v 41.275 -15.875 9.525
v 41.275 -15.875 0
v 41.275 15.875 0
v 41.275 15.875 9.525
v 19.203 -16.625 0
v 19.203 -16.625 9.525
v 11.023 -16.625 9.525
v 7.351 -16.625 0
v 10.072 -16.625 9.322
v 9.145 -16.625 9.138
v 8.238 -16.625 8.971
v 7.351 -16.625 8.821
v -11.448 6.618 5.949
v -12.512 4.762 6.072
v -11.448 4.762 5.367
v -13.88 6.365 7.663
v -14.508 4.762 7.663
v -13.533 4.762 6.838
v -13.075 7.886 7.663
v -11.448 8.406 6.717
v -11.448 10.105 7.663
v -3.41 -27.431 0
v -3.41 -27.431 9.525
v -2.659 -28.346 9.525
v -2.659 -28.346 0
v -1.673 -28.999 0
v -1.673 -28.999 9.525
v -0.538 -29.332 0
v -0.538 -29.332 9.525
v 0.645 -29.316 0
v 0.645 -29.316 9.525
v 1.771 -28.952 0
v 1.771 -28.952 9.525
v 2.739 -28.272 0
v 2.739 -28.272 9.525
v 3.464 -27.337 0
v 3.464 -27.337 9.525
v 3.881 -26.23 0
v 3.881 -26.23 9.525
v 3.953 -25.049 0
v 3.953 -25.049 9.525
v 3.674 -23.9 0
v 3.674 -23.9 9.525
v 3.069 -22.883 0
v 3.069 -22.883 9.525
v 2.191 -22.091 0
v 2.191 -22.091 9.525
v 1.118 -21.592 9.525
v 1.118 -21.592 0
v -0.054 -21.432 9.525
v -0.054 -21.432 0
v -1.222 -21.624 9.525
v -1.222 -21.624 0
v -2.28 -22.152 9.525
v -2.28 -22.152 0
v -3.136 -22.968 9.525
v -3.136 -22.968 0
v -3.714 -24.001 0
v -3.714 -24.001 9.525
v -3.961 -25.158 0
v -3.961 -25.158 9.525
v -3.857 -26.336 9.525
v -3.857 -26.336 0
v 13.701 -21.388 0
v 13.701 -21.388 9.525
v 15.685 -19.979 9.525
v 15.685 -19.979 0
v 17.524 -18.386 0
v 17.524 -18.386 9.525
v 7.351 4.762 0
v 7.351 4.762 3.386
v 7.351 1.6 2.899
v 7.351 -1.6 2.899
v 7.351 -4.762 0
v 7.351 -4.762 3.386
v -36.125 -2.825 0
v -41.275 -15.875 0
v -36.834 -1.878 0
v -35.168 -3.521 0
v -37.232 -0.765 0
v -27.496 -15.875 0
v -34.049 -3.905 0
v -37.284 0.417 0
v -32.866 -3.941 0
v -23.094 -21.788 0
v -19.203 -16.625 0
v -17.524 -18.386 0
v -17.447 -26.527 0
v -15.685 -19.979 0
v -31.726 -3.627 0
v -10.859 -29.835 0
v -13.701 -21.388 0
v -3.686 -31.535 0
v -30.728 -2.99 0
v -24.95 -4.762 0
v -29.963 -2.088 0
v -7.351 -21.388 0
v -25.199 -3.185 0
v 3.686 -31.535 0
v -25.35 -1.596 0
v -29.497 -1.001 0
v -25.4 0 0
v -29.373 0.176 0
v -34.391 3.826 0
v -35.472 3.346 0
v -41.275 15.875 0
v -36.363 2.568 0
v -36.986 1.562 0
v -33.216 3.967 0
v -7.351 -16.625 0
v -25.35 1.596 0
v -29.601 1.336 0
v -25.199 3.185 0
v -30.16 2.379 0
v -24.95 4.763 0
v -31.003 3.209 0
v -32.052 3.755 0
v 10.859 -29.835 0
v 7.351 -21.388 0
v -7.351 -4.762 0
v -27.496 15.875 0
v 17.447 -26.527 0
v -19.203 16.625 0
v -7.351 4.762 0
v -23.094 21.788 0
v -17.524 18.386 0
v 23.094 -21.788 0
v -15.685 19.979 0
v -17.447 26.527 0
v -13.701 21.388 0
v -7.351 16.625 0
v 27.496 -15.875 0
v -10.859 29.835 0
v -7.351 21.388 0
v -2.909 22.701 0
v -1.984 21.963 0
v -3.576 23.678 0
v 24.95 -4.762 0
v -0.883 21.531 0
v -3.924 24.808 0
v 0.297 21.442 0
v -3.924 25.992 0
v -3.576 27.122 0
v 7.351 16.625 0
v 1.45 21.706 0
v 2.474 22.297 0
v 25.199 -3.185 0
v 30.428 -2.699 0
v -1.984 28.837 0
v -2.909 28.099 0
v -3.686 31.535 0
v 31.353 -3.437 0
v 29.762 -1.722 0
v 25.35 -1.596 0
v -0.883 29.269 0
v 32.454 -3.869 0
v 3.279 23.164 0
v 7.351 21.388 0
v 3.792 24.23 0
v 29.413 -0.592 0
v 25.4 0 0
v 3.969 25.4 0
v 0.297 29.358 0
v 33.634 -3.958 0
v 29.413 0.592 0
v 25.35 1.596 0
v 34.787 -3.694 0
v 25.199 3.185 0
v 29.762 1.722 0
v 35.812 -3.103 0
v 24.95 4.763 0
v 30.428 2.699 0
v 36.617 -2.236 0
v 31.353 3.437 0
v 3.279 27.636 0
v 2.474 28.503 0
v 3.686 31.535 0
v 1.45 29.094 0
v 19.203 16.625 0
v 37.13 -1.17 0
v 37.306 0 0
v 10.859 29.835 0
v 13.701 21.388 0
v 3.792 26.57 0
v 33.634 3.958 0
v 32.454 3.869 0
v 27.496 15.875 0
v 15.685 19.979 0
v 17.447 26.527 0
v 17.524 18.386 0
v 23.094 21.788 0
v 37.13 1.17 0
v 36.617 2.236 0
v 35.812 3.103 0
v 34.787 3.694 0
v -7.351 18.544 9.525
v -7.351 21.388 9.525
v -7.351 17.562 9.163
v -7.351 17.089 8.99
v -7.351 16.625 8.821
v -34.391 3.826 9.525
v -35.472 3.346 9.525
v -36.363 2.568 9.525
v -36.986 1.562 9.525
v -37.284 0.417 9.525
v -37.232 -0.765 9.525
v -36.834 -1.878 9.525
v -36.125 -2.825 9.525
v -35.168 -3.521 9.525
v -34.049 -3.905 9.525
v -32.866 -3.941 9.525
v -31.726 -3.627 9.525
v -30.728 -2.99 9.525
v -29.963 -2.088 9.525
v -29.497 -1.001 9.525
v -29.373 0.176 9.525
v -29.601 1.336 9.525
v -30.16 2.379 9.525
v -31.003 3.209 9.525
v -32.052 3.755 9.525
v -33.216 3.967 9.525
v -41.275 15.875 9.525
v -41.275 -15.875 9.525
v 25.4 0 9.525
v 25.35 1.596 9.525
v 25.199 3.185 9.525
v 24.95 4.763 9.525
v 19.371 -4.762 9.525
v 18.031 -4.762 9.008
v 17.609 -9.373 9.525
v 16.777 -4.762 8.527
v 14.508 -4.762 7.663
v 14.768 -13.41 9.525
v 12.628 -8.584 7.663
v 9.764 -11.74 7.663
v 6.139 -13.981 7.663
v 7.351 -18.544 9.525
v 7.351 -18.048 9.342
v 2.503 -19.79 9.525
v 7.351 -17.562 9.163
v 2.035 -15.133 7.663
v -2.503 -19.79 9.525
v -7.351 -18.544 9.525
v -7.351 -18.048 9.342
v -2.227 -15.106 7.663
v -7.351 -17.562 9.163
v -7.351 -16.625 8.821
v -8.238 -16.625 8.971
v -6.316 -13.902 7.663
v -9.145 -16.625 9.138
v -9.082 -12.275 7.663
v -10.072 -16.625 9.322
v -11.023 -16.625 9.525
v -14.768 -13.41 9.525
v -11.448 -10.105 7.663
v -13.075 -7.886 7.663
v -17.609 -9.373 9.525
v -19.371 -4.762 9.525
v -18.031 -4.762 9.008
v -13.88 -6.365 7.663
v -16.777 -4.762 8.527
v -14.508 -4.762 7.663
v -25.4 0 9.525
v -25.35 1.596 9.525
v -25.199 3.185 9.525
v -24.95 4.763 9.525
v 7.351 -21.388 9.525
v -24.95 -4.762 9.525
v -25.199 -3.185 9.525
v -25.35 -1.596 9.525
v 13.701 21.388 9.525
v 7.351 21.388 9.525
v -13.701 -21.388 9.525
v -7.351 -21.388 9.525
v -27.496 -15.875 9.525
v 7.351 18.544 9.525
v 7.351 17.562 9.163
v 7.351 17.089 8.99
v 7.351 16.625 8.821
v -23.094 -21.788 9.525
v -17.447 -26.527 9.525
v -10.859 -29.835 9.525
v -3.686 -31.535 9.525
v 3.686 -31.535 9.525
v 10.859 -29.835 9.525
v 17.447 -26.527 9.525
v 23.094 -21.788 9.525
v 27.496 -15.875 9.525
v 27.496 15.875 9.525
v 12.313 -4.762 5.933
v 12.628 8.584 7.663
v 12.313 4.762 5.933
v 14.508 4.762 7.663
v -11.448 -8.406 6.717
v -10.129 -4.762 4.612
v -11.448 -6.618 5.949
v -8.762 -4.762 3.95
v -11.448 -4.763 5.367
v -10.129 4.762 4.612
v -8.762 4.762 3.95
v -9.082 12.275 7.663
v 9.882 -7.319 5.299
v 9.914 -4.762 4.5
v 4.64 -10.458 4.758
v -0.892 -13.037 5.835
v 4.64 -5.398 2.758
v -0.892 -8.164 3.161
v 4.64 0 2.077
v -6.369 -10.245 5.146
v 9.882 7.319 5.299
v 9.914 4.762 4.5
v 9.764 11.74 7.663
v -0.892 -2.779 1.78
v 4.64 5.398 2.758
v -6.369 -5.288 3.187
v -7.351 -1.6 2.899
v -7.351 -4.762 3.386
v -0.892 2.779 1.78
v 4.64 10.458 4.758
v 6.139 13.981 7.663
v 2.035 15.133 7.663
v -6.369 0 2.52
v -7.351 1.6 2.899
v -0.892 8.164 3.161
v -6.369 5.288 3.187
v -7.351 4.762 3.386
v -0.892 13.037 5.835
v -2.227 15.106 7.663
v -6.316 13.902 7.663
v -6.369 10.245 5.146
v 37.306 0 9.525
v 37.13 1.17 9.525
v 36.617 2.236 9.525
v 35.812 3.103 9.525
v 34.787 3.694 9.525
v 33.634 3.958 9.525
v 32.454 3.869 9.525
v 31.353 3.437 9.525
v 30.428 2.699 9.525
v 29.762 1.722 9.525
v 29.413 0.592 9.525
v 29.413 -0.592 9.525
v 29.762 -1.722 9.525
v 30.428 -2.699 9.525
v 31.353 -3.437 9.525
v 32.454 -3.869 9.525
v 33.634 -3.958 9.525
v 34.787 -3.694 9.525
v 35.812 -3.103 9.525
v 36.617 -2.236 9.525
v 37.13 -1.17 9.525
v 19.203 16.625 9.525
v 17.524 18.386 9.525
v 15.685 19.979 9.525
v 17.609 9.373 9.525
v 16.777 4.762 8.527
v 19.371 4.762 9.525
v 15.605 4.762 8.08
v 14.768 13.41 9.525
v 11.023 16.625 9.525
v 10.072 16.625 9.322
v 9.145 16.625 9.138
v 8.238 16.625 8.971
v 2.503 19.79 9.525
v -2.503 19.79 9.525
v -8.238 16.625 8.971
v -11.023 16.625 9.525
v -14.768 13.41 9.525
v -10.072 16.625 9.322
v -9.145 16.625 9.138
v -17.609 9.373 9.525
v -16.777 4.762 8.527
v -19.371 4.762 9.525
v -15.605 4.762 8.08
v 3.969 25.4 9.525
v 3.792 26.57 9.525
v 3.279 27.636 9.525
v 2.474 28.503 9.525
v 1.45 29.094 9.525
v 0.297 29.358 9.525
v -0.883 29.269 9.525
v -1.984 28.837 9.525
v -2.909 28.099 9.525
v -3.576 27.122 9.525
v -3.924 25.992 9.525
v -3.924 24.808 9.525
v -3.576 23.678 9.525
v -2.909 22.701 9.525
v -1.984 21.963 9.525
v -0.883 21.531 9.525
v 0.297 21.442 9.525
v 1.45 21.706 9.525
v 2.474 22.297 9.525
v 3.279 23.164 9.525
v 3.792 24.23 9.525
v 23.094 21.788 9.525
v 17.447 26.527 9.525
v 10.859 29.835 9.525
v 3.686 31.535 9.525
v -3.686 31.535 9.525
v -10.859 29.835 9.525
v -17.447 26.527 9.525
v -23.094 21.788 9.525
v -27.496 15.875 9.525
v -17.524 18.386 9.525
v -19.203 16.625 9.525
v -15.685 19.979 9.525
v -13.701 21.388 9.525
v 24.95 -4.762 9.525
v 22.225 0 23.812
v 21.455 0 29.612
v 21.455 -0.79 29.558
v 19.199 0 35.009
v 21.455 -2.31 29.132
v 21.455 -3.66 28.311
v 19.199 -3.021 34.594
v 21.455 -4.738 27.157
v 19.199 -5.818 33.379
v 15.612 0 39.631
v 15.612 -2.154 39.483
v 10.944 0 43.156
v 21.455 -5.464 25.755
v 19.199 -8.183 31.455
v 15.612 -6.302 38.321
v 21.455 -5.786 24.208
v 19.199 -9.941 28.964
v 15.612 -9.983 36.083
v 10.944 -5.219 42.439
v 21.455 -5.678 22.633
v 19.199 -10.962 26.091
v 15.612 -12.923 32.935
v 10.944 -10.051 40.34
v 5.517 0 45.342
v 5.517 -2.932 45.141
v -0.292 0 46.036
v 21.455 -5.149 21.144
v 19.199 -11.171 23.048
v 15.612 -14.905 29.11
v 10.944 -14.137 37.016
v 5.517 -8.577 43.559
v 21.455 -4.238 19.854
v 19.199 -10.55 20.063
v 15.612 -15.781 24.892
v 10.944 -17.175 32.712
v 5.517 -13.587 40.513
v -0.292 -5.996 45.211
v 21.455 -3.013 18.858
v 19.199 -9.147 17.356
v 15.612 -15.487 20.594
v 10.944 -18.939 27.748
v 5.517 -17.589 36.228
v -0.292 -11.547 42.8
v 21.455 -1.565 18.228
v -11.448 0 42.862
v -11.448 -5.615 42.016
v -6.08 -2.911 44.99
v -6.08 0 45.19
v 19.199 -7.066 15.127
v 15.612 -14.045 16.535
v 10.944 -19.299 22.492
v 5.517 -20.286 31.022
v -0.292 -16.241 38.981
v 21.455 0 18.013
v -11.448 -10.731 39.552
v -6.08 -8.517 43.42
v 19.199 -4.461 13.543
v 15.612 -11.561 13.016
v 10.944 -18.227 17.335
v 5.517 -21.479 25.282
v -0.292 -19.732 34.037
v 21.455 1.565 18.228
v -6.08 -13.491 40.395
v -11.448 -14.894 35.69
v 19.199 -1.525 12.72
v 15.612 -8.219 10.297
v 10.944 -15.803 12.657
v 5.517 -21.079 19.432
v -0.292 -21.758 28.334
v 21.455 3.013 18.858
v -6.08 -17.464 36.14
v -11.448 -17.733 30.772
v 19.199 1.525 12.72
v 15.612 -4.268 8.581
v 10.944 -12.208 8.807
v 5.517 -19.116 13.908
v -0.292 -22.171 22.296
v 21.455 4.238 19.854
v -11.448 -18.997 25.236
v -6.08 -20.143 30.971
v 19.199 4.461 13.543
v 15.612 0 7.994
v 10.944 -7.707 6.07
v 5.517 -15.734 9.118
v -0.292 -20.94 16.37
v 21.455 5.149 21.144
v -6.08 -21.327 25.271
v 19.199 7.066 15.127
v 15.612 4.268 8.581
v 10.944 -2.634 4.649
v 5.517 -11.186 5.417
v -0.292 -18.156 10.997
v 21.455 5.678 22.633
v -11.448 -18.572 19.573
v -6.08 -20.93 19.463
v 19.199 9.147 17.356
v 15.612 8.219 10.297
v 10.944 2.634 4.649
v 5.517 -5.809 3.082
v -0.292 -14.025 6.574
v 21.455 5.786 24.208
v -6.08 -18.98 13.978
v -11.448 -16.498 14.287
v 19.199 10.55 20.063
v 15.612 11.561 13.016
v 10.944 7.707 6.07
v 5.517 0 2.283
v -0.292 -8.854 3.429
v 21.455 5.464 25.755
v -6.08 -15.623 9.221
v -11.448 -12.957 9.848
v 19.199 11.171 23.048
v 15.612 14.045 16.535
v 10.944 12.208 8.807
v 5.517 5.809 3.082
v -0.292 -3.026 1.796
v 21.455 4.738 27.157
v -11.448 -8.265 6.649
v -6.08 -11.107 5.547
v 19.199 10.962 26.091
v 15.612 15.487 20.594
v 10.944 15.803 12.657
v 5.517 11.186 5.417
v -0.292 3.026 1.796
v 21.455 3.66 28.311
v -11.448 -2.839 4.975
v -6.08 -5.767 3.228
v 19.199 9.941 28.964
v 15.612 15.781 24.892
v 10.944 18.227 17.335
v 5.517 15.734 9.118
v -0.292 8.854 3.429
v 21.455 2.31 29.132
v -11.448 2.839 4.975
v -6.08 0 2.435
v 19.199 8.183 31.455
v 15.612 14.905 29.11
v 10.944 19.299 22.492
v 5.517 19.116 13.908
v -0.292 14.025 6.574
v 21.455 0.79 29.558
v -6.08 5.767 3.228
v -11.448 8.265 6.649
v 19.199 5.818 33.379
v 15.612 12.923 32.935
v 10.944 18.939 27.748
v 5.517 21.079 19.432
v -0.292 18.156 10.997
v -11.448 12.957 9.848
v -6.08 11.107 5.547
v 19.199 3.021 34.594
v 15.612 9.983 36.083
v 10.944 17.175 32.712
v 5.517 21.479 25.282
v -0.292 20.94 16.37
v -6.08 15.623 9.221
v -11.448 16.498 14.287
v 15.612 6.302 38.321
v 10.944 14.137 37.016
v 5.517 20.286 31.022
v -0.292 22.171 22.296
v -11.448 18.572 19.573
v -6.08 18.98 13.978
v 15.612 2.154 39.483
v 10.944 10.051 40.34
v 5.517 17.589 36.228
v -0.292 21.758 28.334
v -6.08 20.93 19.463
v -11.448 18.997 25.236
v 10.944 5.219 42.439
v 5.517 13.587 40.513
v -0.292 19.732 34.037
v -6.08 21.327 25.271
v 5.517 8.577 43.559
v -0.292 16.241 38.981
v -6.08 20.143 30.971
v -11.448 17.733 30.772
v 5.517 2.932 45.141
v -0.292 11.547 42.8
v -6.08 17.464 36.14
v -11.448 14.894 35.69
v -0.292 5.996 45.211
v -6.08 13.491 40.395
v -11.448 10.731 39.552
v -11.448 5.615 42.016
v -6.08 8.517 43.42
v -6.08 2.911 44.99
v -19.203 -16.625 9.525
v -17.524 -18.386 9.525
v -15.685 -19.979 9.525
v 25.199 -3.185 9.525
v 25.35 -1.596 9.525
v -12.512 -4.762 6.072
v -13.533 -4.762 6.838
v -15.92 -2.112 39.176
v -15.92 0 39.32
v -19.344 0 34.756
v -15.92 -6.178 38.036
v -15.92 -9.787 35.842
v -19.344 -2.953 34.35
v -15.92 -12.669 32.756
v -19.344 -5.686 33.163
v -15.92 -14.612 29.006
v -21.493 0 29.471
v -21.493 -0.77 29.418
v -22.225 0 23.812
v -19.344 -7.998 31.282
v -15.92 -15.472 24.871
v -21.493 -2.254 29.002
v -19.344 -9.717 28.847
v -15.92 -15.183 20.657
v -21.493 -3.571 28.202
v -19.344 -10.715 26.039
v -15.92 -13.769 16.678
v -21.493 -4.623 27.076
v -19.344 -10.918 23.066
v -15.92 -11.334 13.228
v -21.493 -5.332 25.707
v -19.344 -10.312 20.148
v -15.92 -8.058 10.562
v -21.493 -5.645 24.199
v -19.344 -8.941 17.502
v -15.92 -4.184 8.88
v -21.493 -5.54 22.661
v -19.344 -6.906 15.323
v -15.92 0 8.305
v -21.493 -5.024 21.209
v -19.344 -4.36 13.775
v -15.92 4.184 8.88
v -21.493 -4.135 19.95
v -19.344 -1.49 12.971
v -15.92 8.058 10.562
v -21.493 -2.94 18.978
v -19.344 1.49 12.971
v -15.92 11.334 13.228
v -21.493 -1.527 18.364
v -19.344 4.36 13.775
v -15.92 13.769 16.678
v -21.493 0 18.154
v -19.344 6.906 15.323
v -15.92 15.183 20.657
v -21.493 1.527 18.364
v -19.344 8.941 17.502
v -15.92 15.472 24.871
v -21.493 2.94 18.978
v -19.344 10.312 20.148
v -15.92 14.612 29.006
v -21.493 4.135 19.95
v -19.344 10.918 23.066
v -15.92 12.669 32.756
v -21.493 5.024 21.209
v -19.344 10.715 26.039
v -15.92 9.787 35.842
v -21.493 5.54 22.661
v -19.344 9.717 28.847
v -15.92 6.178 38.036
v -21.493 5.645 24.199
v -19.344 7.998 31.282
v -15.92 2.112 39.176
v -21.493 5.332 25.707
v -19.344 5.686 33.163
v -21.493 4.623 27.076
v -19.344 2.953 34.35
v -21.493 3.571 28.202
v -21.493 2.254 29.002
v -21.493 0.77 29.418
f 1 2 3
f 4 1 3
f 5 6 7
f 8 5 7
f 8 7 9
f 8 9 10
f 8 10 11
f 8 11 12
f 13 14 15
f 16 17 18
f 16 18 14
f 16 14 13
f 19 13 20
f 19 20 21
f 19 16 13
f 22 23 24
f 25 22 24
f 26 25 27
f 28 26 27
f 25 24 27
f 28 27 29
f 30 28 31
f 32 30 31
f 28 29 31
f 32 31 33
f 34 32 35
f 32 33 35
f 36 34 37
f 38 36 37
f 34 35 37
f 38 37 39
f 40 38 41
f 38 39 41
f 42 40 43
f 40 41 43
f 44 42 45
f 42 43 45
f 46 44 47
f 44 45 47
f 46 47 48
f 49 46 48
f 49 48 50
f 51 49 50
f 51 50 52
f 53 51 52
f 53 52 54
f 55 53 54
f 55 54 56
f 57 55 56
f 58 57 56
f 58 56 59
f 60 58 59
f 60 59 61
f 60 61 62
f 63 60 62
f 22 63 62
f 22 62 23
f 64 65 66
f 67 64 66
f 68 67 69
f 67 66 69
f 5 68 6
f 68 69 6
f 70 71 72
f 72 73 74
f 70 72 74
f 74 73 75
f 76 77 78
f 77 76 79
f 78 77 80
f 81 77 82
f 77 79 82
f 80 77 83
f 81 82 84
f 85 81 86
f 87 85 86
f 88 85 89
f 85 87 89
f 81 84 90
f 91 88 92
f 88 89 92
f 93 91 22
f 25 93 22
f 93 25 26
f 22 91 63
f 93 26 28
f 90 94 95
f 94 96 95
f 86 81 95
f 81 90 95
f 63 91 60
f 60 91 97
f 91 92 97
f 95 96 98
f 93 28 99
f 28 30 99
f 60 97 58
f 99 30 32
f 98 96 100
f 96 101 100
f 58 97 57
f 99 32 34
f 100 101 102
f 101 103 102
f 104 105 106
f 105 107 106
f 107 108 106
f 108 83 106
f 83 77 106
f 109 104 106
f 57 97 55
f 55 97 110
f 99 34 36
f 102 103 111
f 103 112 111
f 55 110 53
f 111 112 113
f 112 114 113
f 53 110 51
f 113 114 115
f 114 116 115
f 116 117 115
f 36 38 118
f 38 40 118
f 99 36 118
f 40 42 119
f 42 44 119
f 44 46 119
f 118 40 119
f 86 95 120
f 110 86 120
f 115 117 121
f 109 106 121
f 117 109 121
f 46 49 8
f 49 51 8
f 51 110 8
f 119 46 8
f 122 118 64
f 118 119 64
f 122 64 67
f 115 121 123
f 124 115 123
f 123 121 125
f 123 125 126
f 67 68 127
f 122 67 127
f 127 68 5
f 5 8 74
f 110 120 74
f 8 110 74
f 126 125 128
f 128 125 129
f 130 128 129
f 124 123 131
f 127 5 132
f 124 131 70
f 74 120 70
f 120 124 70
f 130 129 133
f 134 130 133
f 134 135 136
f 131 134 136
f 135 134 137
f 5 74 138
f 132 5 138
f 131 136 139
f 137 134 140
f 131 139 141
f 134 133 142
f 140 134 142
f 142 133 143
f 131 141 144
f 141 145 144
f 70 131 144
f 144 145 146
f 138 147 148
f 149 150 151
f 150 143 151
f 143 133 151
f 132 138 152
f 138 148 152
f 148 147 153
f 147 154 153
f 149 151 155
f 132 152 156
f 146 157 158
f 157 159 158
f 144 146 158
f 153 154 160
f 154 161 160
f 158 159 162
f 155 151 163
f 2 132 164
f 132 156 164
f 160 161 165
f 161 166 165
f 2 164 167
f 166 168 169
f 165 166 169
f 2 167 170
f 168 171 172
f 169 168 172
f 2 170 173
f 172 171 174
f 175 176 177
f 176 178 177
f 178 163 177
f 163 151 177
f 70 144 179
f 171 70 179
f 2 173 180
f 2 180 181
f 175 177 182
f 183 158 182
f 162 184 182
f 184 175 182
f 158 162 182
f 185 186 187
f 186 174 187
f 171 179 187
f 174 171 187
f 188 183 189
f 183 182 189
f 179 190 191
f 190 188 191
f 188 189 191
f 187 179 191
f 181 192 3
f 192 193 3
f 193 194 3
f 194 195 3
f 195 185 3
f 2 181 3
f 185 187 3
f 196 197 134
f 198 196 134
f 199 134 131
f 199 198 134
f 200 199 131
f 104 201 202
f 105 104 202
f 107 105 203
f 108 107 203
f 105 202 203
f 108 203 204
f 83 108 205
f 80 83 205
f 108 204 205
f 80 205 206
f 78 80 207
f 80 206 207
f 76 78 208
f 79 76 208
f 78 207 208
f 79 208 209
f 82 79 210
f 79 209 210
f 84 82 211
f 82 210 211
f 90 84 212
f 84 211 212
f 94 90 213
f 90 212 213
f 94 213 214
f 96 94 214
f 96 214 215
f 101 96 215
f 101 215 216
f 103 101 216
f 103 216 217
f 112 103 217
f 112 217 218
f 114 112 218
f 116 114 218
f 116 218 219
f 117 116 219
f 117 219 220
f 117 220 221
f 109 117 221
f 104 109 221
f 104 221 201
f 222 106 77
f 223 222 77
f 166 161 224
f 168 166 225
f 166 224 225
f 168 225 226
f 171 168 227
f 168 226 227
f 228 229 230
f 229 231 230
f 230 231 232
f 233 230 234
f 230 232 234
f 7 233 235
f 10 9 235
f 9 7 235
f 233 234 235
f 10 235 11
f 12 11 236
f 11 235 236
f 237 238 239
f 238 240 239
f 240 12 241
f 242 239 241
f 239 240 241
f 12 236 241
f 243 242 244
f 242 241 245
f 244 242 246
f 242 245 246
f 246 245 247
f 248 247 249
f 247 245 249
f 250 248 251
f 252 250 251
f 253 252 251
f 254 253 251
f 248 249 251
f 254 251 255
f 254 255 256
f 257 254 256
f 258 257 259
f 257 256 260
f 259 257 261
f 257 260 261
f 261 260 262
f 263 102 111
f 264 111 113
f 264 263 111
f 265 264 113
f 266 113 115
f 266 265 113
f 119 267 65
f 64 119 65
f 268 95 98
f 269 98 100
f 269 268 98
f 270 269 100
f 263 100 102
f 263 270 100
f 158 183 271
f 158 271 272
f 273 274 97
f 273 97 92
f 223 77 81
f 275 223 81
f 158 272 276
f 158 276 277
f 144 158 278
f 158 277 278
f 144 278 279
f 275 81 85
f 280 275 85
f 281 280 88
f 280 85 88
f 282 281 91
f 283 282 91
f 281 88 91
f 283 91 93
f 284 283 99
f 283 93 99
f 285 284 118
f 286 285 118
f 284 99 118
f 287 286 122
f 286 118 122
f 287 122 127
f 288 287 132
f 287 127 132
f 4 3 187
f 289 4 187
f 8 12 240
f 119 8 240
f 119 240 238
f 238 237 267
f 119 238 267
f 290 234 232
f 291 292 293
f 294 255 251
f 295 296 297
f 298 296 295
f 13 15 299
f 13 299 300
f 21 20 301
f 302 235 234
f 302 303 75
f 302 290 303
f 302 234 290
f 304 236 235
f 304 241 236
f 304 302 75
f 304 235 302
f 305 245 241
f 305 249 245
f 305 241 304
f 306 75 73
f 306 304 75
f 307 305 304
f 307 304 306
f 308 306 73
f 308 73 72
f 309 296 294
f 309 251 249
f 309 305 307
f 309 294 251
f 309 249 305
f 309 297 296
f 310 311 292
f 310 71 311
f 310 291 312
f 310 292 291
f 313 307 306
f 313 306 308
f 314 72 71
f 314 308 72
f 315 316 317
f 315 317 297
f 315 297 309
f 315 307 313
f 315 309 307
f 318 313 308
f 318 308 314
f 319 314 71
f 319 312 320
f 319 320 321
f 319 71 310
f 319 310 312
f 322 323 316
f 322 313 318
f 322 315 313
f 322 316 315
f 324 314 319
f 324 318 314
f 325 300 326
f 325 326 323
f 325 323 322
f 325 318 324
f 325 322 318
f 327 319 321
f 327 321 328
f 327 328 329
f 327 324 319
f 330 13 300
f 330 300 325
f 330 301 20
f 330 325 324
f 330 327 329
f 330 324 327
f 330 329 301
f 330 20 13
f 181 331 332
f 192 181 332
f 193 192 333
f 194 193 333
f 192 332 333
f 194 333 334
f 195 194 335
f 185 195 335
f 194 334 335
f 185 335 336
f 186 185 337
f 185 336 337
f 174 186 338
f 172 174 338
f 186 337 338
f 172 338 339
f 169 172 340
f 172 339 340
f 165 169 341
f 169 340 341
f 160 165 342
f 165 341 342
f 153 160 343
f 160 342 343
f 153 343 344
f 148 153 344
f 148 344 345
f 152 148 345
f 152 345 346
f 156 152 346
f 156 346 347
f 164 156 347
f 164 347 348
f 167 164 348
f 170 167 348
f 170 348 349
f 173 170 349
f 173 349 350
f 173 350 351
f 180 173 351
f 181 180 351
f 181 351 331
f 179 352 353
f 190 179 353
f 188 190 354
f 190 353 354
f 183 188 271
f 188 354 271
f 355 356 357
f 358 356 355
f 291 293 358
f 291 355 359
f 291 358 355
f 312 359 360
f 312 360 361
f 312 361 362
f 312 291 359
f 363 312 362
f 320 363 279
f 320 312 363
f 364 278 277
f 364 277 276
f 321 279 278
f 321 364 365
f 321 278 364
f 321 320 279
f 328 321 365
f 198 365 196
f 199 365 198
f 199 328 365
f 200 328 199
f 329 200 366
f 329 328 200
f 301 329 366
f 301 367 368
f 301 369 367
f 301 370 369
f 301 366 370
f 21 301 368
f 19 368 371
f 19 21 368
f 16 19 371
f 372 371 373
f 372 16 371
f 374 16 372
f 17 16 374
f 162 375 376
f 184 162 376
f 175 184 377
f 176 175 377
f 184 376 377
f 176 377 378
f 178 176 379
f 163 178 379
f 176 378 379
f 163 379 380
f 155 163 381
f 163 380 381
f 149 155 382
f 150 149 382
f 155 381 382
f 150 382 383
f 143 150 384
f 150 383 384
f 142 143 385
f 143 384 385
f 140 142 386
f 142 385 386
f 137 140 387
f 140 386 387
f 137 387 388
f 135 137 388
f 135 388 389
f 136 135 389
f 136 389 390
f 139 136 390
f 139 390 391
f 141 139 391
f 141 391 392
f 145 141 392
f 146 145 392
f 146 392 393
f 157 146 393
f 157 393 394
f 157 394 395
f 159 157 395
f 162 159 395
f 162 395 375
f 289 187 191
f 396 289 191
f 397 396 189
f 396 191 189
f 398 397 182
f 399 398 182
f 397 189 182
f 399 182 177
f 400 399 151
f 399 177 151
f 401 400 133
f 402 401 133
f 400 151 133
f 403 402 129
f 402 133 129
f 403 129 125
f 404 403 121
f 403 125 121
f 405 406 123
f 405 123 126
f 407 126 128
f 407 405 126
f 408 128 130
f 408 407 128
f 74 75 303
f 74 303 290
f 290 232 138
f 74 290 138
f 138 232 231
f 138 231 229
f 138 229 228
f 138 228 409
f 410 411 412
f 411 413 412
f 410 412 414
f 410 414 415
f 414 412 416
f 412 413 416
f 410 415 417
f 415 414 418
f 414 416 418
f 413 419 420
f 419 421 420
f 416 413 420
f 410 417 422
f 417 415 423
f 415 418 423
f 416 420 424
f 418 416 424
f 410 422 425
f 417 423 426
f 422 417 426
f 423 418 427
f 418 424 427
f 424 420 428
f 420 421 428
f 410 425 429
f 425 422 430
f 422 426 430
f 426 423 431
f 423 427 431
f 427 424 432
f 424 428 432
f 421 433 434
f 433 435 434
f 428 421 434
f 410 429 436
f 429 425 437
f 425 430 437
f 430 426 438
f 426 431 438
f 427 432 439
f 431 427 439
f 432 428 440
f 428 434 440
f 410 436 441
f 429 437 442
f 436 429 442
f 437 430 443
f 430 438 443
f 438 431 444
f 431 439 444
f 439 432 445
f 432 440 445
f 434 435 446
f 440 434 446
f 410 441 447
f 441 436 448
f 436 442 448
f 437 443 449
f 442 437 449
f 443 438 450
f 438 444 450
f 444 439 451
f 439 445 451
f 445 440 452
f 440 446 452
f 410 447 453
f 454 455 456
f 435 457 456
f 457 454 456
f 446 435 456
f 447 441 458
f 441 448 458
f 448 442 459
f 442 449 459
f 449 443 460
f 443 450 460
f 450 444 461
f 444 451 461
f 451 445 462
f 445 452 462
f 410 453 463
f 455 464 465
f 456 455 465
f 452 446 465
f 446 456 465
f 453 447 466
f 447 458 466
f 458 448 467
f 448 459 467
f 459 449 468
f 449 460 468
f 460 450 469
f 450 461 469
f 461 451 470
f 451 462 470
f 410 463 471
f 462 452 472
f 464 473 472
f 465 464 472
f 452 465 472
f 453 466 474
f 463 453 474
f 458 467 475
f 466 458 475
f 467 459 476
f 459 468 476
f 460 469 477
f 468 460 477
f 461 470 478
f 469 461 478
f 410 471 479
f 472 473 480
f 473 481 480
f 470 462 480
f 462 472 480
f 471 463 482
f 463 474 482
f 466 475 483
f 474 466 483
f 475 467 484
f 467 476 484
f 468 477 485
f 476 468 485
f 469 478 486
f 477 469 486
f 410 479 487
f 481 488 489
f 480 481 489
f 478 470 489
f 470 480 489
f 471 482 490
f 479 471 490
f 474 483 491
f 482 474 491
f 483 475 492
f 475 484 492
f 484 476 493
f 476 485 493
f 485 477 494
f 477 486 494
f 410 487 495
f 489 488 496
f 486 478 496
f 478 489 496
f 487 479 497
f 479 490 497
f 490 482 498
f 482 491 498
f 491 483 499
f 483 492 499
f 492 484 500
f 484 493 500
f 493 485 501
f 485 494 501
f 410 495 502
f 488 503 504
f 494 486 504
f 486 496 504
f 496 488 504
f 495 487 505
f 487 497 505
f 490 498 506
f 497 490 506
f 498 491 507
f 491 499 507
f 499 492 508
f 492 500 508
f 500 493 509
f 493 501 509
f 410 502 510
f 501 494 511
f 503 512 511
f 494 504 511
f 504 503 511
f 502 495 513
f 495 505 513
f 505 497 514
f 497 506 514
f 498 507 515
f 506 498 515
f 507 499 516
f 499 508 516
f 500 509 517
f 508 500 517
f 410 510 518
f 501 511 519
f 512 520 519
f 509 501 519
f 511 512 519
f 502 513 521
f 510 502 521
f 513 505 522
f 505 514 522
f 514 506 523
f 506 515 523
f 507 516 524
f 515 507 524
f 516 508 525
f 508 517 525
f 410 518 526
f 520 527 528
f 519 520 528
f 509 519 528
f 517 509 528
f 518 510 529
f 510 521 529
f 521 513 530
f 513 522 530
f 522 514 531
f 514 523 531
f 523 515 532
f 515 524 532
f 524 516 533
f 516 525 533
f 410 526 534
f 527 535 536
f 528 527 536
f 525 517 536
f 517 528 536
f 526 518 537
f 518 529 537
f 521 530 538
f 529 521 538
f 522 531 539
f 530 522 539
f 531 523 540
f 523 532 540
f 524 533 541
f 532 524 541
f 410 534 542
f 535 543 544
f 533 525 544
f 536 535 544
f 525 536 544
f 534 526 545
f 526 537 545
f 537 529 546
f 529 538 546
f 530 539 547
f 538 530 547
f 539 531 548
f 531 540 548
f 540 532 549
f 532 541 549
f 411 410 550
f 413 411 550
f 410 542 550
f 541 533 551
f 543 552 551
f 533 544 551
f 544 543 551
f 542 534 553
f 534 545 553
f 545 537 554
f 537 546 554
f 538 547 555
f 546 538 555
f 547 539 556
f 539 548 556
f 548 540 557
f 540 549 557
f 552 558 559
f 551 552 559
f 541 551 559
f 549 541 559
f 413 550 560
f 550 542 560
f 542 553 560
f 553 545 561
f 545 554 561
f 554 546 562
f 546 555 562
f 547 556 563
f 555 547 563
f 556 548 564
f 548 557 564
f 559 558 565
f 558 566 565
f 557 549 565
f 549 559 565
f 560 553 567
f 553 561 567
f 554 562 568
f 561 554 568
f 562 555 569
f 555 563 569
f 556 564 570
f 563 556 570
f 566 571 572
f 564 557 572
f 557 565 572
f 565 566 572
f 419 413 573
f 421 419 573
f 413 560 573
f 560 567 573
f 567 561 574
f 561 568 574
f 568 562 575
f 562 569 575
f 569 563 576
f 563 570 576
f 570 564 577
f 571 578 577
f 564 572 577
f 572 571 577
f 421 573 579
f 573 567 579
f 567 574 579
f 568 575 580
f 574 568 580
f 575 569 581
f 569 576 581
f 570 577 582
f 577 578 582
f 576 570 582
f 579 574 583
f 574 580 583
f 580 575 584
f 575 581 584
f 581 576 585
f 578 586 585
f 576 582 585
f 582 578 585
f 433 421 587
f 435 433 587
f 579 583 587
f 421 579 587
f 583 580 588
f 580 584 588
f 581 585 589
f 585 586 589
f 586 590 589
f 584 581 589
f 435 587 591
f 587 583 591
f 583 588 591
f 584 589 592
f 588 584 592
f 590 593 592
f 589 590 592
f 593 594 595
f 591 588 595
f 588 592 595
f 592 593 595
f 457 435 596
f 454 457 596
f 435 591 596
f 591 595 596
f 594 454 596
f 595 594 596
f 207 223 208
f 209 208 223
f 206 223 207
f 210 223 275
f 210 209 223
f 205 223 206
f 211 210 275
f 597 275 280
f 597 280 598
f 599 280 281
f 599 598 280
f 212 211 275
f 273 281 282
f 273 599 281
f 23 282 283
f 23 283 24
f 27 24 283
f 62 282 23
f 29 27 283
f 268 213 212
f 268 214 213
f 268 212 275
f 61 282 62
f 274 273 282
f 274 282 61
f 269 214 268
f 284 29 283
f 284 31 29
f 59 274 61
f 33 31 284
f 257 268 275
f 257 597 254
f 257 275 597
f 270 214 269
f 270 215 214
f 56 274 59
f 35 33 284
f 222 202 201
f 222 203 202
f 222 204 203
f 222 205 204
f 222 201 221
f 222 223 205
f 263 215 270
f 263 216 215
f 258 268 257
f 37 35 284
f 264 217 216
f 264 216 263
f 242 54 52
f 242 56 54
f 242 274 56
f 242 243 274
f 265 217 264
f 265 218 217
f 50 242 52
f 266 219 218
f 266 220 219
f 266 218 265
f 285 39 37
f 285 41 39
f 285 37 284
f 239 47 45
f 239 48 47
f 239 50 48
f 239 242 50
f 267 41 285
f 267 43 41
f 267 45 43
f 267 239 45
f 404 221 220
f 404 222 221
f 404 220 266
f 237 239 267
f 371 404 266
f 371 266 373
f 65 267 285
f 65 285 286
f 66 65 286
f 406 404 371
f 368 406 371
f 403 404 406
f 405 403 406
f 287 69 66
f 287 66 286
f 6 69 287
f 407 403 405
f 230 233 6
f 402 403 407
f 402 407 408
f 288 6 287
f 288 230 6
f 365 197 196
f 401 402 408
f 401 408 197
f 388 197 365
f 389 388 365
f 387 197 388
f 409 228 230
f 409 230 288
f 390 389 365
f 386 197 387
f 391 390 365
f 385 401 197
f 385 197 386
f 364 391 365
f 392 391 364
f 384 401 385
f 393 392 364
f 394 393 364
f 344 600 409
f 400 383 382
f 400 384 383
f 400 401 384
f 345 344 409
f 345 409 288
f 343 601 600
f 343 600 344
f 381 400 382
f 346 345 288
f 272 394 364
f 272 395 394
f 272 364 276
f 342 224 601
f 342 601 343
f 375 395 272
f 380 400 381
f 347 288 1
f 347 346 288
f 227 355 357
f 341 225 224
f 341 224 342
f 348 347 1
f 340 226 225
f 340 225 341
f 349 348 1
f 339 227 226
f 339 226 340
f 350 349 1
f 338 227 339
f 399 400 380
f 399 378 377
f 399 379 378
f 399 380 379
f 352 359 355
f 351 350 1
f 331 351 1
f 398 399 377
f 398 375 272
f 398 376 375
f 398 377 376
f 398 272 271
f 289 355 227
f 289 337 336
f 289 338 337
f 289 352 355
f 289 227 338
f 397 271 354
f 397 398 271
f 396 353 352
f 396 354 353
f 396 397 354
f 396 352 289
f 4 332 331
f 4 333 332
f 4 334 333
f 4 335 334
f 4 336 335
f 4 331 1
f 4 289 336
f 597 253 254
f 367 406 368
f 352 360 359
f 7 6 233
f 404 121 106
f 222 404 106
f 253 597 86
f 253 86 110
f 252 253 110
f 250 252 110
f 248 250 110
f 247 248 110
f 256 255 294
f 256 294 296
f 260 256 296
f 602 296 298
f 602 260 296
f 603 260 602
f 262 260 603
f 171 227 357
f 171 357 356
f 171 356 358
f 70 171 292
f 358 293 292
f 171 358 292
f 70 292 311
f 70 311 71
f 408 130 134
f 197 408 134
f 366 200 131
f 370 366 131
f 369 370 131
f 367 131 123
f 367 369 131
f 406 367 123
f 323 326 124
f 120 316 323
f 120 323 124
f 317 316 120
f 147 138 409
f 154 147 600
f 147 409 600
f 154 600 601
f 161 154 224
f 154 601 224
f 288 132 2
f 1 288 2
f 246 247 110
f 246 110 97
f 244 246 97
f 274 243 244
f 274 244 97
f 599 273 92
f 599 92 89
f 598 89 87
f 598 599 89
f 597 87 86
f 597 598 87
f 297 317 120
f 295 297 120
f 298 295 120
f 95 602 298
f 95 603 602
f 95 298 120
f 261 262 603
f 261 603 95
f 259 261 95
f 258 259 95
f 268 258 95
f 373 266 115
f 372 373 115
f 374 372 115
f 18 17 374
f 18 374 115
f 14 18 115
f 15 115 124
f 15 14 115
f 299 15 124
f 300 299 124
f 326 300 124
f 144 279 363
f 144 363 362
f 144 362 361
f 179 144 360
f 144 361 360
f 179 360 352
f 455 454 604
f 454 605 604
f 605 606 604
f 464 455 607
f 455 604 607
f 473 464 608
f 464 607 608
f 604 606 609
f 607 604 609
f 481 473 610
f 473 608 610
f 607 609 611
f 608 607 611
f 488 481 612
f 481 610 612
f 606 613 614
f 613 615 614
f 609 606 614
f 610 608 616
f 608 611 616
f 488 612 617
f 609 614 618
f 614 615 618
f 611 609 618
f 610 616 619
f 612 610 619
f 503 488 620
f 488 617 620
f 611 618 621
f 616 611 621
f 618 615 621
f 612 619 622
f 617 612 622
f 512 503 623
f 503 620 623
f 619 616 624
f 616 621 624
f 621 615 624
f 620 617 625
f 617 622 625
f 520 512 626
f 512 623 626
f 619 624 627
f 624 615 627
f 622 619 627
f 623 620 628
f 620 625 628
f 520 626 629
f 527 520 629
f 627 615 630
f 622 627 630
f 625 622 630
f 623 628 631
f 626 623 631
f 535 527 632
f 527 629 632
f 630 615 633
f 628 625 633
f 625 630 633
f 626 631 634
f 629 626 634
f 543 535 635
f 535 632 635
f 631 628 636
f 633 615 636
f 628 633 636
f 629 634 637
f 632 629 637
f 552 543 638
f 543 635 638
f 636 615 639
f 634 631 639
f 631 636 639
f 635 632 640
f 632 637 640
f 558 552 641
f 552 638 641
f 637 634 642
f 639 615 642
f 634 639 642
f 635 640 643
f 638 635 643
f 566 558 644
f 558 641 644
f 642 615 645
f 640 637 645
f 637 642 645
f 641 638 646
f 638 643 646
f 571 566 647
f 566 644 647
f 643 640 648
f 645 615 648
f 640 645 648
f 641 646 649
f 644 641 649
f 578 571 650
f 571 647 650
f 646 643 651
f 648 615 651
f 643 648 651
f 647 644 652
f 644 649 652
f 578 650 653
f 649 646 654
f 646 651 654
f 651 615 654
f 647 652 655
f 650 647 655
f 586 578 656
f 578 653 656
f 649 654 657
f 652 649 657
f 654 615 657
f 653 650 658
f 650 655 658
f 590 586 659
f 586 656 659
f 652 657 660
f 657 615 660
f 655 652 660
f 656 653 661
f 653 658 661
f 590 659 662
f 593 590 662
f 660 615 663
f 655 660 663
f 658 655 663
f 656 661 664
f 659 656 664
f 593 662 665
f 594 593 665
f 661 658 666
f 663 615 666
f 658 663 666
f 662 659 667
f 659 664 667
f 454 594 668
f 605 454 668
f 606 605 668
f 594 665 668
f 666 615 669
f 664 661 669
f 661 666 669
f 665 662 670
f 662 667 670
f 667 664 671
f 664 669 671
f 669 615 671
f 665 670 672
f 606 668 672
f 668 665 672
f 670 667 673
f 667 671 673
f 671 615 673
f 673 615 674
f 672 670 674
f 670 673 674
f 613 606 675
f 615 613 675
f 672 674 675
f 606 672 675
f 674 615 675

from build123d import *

# Parameters (mm, degrees)
F1_DEPTH        = 9.525
F3_DEPTH        = 9.525
F6_R            = 3.96875
F7_DEPTH        = 9.526
F7_COPIES_COUNT = 3
F7_COPIES_ANGLE = 210.7842
F9_T2_ANGLE     = 198.7595657962
F9_T4_ANGLE     = 198.7595657962


# Not quite as in the source:
# - a fillet or chamfer that OpenCascade refuses, or shapes differently, is made with other operations: its cross-section is extruded or revolved along the edge and cut away or added
# - a pattern or mirror of a feature is missing from the dataset's text; its kind, count and spacing are read off the source's solid


with BuildPart() as f1:
    # F0 (on Top) → F1 (new body)
    with BuildSketch(Plane.XY):
        with BuildLine():
            Line((-41.275, -15.875), (-27.4963065702, -15.875))
            ThreePointArc((-27.4963065702, -15.875), (0, -31.75), (27.4963065702, -15.875))
            Line((27.4963065702, -15.875), (41.275, -15.875))
            Line((41.275, -15.875), (41.275, 15.875))
            Line((41.275, 15.875), (27.4963065702, 15.875))
            ThreePointArc((27.4963065702, 15.875), (0, 31.75), (-27.4963065702, 15.875))
            Line((-27.4963065702, 15.875), (-41.275, 15.875))
            Line((-41.275, 15.875), (-41.275, -15.875))
        make_face()
    extrude(amount=F1_DEPTH)

    # F2 (on face) → F3 (cut)
    with BuildSketch(Plane.XY.offset(9.525)):
        with BuildLine():
            Line((7.3510025854, 16.625406119), (19.2030172468, 16.625406119))
            ThreePointArc((19.2030172468, 16.625406119), (16.6234467498, 19.204713436), (13.7010025854, 21.387906119))
            Line((13.7010025854, 21.387906119), (7.3510025854, 21.387906119))
            Line((7.3510025854, 21.387906119), (7.3510025854, 16.625406119))
        make_face()
        with BuildLine():
            ThreePointArc((24.9495209122, -4.7625), (25.2871294453, -2.3918788461), (25.4, 0))
            ThreePointArc((25.4, 0), (25.2871294453, 2.3918788461), (24.9495209122, 4.7625))
            Line((24.9495209122, 4.7625), (7.3510025854, 4.7625))
            Line((7.3510025854, 4.7625), (7.3510025854, -4.7625))
            Line((7.3510025854, -4.7625), (24.9495209122, -4.7625))
        make_face()
        with BuildLine():
            ThreePointArc((13.7010025854, -21.387906119), (16.6234467498, -19.204713436), (19.2030172468, -16.625406119))
            Line((19.2030172468, -16.625406119), (7.3510025854, -16.625406119))
            Line((7.3510025854, -16.625406119), (7.3510025854, -21.387906119))
            Line((7.3510025854, -21.387906119), (13.7010025854, -21.387906119))
        make_face()
    f3 = extrude(amount=-F3_DEPTH, mode=Mode.SUBTRACT)

    # F3_copies: F3 across plane
    add(f3.mirror(Plane(origin=(0, 0, 0), x_dir=(0, 0, -1), z_dir=(-1, 0, 0))), mode=Mode.SUBTRACT)

    # F4 (on Front) → F5 (revolve, cut)
    with BuildSketch(Plane.XZ):
        with BuildLine():
            Line((-22.225, 23.8125), (22.225, 23.8125))
            ThreePointArc((22.225, 23.8125), (19.3439150288, 34.7561546162), (11.4476252996, 42.8625))
            ThreePointArc((11.4476252996, 42.8625), (0, 46.0375), (-11.4476252996, 42.8625))
            ThreePointArc((-11.4476252996, 42.8625), (-19.3439150288, 34.7561546162), (-22.225, 23.8125))
        make_face()
    revolve(axis=Axis((0, 0, 23.8125), (1, 0, 0)), mode=Mode.SUBTRACT)

    # F6 (on face) → F7 (cut, through all)
    with BuildSketch(Plane.XY.offset(9.525)):
        with Locations((0, 25.4)):
            Circle(F6_R)
        with Locations((33.3375, 0)):
            Circle(F6_R)
    f7 = extrude(amount=-F7_DEPTH, mode=Mode.SUBTRACT)

    # F7_copies: F7 ×3 about axis
    f7_copies_axis = Axis((-6.99256, 0, 0), (0, 0, 1))
    for i in range(1, F7_COPIES_COUNT):
        add(f7.rotate(f7_copies_axis, i * F7_COPIES_ANGLE / (F7_COPIES_COUNT - 1)), mode=Mode.SUBTRACT)

    # F9: chamfer of 3.175 on 2 edges, made by hand

    # F9_s1 → F9_t2 (revolve, cut)
    with BuildSketch(Plane(origin=(0, 0, 0), x_dir=(0, 0, 1), z_dir=(-0.1629778352, 0.9866297306, 0))):
        with BuildLine():
            Line((9.5719539947, 20.0659493432), (7.6164291959, 15.1514665774))
            Line((7.6164291959, 15.1514665774), (7.6625695297, 15.1078395261))
            ThreePointArc((7.6625695297, 15.1078395261), (8.5706488123, 16.0878231784), (9.5658214286, 16.9754007886))
            Line((9.5658214286, 16.9754007886), (9.5885, 17.0240409054))
            ThreePointArc((9.5885, 17.0240409054), (9.5885, 18.5449951243), (9.6354539947, 20.0659493432))
            Line((9.6354539947, 20.0659493432), (9.5719539947, 20.0659493432))
        make_face()
    revolve(axis=Axis((0, 0, 9.525), (0, 0, -1)), revolution_arc=F9_T2_ANGLE, mode=Mode.SUBTRACT)

    # F9_s3 → F9_t4 (revolve, cut)
    with BuildSketch(Plane(origin=(0, 0, 0), x_dir=(0, 0, 1), z_dir=(-0.1629778352, -0.9866297306, 0))):
        with BuildLine():
            Line((9.5719539947, -20.0659493432), (7.6164291959, -15.1514665774))
            Line((7.6164291959, -15.1514665774), (7.6625695297, -15.1078395261))
            ThreePointArc((7.6625695297, -15.1078395261), (8.5706488123, -16.0878231784), (9.5658214286, -16.9754007886))
            Line((9.5658214286, -16.9754007886), (9.5885, -17.0240409054))
            ThreePointArc((9.5885, -17.0240409054), (9.5885, -18.5449951243), (9.6354539947, -20.0659493432))
            Line((9.6354539947, -20.0659493432), (9.5719539947, -20.0659493432))
        make_face()
    revolve(axis=Axis((0, 0, 9.525), (0, 0, 1)), revolution_arc=F9_T4_ANGLE, mode=Mode.SUBTRACT)


with BuildPart() as f8:
    # F4 (on Front) → F8 (revolve)
    with BuildSketch(Plane.XZ):
        with BuildLine():
            Line((-22.225, 23.8125), (22.225, 23.8125))
            ThreePointArc((22.225, 23.8125), (19.3439150288, 34.7561546162), (11.4476252996, 42.8625))
            ThreePointArc((11.4476252996, 42.8625), (0, 46.0375), (-11.4476252996, 42.8625))
            ThreePointArc((-11.4476252996, 42.8625), (-19.3439150288, 34.7561546162), (-22.225, 23.8125))
        make_face()
    revolve(axis=Axis((0, 0, 23.8125), (1, 0, 0)))


solid = Compound([f1.part, f8.part])
